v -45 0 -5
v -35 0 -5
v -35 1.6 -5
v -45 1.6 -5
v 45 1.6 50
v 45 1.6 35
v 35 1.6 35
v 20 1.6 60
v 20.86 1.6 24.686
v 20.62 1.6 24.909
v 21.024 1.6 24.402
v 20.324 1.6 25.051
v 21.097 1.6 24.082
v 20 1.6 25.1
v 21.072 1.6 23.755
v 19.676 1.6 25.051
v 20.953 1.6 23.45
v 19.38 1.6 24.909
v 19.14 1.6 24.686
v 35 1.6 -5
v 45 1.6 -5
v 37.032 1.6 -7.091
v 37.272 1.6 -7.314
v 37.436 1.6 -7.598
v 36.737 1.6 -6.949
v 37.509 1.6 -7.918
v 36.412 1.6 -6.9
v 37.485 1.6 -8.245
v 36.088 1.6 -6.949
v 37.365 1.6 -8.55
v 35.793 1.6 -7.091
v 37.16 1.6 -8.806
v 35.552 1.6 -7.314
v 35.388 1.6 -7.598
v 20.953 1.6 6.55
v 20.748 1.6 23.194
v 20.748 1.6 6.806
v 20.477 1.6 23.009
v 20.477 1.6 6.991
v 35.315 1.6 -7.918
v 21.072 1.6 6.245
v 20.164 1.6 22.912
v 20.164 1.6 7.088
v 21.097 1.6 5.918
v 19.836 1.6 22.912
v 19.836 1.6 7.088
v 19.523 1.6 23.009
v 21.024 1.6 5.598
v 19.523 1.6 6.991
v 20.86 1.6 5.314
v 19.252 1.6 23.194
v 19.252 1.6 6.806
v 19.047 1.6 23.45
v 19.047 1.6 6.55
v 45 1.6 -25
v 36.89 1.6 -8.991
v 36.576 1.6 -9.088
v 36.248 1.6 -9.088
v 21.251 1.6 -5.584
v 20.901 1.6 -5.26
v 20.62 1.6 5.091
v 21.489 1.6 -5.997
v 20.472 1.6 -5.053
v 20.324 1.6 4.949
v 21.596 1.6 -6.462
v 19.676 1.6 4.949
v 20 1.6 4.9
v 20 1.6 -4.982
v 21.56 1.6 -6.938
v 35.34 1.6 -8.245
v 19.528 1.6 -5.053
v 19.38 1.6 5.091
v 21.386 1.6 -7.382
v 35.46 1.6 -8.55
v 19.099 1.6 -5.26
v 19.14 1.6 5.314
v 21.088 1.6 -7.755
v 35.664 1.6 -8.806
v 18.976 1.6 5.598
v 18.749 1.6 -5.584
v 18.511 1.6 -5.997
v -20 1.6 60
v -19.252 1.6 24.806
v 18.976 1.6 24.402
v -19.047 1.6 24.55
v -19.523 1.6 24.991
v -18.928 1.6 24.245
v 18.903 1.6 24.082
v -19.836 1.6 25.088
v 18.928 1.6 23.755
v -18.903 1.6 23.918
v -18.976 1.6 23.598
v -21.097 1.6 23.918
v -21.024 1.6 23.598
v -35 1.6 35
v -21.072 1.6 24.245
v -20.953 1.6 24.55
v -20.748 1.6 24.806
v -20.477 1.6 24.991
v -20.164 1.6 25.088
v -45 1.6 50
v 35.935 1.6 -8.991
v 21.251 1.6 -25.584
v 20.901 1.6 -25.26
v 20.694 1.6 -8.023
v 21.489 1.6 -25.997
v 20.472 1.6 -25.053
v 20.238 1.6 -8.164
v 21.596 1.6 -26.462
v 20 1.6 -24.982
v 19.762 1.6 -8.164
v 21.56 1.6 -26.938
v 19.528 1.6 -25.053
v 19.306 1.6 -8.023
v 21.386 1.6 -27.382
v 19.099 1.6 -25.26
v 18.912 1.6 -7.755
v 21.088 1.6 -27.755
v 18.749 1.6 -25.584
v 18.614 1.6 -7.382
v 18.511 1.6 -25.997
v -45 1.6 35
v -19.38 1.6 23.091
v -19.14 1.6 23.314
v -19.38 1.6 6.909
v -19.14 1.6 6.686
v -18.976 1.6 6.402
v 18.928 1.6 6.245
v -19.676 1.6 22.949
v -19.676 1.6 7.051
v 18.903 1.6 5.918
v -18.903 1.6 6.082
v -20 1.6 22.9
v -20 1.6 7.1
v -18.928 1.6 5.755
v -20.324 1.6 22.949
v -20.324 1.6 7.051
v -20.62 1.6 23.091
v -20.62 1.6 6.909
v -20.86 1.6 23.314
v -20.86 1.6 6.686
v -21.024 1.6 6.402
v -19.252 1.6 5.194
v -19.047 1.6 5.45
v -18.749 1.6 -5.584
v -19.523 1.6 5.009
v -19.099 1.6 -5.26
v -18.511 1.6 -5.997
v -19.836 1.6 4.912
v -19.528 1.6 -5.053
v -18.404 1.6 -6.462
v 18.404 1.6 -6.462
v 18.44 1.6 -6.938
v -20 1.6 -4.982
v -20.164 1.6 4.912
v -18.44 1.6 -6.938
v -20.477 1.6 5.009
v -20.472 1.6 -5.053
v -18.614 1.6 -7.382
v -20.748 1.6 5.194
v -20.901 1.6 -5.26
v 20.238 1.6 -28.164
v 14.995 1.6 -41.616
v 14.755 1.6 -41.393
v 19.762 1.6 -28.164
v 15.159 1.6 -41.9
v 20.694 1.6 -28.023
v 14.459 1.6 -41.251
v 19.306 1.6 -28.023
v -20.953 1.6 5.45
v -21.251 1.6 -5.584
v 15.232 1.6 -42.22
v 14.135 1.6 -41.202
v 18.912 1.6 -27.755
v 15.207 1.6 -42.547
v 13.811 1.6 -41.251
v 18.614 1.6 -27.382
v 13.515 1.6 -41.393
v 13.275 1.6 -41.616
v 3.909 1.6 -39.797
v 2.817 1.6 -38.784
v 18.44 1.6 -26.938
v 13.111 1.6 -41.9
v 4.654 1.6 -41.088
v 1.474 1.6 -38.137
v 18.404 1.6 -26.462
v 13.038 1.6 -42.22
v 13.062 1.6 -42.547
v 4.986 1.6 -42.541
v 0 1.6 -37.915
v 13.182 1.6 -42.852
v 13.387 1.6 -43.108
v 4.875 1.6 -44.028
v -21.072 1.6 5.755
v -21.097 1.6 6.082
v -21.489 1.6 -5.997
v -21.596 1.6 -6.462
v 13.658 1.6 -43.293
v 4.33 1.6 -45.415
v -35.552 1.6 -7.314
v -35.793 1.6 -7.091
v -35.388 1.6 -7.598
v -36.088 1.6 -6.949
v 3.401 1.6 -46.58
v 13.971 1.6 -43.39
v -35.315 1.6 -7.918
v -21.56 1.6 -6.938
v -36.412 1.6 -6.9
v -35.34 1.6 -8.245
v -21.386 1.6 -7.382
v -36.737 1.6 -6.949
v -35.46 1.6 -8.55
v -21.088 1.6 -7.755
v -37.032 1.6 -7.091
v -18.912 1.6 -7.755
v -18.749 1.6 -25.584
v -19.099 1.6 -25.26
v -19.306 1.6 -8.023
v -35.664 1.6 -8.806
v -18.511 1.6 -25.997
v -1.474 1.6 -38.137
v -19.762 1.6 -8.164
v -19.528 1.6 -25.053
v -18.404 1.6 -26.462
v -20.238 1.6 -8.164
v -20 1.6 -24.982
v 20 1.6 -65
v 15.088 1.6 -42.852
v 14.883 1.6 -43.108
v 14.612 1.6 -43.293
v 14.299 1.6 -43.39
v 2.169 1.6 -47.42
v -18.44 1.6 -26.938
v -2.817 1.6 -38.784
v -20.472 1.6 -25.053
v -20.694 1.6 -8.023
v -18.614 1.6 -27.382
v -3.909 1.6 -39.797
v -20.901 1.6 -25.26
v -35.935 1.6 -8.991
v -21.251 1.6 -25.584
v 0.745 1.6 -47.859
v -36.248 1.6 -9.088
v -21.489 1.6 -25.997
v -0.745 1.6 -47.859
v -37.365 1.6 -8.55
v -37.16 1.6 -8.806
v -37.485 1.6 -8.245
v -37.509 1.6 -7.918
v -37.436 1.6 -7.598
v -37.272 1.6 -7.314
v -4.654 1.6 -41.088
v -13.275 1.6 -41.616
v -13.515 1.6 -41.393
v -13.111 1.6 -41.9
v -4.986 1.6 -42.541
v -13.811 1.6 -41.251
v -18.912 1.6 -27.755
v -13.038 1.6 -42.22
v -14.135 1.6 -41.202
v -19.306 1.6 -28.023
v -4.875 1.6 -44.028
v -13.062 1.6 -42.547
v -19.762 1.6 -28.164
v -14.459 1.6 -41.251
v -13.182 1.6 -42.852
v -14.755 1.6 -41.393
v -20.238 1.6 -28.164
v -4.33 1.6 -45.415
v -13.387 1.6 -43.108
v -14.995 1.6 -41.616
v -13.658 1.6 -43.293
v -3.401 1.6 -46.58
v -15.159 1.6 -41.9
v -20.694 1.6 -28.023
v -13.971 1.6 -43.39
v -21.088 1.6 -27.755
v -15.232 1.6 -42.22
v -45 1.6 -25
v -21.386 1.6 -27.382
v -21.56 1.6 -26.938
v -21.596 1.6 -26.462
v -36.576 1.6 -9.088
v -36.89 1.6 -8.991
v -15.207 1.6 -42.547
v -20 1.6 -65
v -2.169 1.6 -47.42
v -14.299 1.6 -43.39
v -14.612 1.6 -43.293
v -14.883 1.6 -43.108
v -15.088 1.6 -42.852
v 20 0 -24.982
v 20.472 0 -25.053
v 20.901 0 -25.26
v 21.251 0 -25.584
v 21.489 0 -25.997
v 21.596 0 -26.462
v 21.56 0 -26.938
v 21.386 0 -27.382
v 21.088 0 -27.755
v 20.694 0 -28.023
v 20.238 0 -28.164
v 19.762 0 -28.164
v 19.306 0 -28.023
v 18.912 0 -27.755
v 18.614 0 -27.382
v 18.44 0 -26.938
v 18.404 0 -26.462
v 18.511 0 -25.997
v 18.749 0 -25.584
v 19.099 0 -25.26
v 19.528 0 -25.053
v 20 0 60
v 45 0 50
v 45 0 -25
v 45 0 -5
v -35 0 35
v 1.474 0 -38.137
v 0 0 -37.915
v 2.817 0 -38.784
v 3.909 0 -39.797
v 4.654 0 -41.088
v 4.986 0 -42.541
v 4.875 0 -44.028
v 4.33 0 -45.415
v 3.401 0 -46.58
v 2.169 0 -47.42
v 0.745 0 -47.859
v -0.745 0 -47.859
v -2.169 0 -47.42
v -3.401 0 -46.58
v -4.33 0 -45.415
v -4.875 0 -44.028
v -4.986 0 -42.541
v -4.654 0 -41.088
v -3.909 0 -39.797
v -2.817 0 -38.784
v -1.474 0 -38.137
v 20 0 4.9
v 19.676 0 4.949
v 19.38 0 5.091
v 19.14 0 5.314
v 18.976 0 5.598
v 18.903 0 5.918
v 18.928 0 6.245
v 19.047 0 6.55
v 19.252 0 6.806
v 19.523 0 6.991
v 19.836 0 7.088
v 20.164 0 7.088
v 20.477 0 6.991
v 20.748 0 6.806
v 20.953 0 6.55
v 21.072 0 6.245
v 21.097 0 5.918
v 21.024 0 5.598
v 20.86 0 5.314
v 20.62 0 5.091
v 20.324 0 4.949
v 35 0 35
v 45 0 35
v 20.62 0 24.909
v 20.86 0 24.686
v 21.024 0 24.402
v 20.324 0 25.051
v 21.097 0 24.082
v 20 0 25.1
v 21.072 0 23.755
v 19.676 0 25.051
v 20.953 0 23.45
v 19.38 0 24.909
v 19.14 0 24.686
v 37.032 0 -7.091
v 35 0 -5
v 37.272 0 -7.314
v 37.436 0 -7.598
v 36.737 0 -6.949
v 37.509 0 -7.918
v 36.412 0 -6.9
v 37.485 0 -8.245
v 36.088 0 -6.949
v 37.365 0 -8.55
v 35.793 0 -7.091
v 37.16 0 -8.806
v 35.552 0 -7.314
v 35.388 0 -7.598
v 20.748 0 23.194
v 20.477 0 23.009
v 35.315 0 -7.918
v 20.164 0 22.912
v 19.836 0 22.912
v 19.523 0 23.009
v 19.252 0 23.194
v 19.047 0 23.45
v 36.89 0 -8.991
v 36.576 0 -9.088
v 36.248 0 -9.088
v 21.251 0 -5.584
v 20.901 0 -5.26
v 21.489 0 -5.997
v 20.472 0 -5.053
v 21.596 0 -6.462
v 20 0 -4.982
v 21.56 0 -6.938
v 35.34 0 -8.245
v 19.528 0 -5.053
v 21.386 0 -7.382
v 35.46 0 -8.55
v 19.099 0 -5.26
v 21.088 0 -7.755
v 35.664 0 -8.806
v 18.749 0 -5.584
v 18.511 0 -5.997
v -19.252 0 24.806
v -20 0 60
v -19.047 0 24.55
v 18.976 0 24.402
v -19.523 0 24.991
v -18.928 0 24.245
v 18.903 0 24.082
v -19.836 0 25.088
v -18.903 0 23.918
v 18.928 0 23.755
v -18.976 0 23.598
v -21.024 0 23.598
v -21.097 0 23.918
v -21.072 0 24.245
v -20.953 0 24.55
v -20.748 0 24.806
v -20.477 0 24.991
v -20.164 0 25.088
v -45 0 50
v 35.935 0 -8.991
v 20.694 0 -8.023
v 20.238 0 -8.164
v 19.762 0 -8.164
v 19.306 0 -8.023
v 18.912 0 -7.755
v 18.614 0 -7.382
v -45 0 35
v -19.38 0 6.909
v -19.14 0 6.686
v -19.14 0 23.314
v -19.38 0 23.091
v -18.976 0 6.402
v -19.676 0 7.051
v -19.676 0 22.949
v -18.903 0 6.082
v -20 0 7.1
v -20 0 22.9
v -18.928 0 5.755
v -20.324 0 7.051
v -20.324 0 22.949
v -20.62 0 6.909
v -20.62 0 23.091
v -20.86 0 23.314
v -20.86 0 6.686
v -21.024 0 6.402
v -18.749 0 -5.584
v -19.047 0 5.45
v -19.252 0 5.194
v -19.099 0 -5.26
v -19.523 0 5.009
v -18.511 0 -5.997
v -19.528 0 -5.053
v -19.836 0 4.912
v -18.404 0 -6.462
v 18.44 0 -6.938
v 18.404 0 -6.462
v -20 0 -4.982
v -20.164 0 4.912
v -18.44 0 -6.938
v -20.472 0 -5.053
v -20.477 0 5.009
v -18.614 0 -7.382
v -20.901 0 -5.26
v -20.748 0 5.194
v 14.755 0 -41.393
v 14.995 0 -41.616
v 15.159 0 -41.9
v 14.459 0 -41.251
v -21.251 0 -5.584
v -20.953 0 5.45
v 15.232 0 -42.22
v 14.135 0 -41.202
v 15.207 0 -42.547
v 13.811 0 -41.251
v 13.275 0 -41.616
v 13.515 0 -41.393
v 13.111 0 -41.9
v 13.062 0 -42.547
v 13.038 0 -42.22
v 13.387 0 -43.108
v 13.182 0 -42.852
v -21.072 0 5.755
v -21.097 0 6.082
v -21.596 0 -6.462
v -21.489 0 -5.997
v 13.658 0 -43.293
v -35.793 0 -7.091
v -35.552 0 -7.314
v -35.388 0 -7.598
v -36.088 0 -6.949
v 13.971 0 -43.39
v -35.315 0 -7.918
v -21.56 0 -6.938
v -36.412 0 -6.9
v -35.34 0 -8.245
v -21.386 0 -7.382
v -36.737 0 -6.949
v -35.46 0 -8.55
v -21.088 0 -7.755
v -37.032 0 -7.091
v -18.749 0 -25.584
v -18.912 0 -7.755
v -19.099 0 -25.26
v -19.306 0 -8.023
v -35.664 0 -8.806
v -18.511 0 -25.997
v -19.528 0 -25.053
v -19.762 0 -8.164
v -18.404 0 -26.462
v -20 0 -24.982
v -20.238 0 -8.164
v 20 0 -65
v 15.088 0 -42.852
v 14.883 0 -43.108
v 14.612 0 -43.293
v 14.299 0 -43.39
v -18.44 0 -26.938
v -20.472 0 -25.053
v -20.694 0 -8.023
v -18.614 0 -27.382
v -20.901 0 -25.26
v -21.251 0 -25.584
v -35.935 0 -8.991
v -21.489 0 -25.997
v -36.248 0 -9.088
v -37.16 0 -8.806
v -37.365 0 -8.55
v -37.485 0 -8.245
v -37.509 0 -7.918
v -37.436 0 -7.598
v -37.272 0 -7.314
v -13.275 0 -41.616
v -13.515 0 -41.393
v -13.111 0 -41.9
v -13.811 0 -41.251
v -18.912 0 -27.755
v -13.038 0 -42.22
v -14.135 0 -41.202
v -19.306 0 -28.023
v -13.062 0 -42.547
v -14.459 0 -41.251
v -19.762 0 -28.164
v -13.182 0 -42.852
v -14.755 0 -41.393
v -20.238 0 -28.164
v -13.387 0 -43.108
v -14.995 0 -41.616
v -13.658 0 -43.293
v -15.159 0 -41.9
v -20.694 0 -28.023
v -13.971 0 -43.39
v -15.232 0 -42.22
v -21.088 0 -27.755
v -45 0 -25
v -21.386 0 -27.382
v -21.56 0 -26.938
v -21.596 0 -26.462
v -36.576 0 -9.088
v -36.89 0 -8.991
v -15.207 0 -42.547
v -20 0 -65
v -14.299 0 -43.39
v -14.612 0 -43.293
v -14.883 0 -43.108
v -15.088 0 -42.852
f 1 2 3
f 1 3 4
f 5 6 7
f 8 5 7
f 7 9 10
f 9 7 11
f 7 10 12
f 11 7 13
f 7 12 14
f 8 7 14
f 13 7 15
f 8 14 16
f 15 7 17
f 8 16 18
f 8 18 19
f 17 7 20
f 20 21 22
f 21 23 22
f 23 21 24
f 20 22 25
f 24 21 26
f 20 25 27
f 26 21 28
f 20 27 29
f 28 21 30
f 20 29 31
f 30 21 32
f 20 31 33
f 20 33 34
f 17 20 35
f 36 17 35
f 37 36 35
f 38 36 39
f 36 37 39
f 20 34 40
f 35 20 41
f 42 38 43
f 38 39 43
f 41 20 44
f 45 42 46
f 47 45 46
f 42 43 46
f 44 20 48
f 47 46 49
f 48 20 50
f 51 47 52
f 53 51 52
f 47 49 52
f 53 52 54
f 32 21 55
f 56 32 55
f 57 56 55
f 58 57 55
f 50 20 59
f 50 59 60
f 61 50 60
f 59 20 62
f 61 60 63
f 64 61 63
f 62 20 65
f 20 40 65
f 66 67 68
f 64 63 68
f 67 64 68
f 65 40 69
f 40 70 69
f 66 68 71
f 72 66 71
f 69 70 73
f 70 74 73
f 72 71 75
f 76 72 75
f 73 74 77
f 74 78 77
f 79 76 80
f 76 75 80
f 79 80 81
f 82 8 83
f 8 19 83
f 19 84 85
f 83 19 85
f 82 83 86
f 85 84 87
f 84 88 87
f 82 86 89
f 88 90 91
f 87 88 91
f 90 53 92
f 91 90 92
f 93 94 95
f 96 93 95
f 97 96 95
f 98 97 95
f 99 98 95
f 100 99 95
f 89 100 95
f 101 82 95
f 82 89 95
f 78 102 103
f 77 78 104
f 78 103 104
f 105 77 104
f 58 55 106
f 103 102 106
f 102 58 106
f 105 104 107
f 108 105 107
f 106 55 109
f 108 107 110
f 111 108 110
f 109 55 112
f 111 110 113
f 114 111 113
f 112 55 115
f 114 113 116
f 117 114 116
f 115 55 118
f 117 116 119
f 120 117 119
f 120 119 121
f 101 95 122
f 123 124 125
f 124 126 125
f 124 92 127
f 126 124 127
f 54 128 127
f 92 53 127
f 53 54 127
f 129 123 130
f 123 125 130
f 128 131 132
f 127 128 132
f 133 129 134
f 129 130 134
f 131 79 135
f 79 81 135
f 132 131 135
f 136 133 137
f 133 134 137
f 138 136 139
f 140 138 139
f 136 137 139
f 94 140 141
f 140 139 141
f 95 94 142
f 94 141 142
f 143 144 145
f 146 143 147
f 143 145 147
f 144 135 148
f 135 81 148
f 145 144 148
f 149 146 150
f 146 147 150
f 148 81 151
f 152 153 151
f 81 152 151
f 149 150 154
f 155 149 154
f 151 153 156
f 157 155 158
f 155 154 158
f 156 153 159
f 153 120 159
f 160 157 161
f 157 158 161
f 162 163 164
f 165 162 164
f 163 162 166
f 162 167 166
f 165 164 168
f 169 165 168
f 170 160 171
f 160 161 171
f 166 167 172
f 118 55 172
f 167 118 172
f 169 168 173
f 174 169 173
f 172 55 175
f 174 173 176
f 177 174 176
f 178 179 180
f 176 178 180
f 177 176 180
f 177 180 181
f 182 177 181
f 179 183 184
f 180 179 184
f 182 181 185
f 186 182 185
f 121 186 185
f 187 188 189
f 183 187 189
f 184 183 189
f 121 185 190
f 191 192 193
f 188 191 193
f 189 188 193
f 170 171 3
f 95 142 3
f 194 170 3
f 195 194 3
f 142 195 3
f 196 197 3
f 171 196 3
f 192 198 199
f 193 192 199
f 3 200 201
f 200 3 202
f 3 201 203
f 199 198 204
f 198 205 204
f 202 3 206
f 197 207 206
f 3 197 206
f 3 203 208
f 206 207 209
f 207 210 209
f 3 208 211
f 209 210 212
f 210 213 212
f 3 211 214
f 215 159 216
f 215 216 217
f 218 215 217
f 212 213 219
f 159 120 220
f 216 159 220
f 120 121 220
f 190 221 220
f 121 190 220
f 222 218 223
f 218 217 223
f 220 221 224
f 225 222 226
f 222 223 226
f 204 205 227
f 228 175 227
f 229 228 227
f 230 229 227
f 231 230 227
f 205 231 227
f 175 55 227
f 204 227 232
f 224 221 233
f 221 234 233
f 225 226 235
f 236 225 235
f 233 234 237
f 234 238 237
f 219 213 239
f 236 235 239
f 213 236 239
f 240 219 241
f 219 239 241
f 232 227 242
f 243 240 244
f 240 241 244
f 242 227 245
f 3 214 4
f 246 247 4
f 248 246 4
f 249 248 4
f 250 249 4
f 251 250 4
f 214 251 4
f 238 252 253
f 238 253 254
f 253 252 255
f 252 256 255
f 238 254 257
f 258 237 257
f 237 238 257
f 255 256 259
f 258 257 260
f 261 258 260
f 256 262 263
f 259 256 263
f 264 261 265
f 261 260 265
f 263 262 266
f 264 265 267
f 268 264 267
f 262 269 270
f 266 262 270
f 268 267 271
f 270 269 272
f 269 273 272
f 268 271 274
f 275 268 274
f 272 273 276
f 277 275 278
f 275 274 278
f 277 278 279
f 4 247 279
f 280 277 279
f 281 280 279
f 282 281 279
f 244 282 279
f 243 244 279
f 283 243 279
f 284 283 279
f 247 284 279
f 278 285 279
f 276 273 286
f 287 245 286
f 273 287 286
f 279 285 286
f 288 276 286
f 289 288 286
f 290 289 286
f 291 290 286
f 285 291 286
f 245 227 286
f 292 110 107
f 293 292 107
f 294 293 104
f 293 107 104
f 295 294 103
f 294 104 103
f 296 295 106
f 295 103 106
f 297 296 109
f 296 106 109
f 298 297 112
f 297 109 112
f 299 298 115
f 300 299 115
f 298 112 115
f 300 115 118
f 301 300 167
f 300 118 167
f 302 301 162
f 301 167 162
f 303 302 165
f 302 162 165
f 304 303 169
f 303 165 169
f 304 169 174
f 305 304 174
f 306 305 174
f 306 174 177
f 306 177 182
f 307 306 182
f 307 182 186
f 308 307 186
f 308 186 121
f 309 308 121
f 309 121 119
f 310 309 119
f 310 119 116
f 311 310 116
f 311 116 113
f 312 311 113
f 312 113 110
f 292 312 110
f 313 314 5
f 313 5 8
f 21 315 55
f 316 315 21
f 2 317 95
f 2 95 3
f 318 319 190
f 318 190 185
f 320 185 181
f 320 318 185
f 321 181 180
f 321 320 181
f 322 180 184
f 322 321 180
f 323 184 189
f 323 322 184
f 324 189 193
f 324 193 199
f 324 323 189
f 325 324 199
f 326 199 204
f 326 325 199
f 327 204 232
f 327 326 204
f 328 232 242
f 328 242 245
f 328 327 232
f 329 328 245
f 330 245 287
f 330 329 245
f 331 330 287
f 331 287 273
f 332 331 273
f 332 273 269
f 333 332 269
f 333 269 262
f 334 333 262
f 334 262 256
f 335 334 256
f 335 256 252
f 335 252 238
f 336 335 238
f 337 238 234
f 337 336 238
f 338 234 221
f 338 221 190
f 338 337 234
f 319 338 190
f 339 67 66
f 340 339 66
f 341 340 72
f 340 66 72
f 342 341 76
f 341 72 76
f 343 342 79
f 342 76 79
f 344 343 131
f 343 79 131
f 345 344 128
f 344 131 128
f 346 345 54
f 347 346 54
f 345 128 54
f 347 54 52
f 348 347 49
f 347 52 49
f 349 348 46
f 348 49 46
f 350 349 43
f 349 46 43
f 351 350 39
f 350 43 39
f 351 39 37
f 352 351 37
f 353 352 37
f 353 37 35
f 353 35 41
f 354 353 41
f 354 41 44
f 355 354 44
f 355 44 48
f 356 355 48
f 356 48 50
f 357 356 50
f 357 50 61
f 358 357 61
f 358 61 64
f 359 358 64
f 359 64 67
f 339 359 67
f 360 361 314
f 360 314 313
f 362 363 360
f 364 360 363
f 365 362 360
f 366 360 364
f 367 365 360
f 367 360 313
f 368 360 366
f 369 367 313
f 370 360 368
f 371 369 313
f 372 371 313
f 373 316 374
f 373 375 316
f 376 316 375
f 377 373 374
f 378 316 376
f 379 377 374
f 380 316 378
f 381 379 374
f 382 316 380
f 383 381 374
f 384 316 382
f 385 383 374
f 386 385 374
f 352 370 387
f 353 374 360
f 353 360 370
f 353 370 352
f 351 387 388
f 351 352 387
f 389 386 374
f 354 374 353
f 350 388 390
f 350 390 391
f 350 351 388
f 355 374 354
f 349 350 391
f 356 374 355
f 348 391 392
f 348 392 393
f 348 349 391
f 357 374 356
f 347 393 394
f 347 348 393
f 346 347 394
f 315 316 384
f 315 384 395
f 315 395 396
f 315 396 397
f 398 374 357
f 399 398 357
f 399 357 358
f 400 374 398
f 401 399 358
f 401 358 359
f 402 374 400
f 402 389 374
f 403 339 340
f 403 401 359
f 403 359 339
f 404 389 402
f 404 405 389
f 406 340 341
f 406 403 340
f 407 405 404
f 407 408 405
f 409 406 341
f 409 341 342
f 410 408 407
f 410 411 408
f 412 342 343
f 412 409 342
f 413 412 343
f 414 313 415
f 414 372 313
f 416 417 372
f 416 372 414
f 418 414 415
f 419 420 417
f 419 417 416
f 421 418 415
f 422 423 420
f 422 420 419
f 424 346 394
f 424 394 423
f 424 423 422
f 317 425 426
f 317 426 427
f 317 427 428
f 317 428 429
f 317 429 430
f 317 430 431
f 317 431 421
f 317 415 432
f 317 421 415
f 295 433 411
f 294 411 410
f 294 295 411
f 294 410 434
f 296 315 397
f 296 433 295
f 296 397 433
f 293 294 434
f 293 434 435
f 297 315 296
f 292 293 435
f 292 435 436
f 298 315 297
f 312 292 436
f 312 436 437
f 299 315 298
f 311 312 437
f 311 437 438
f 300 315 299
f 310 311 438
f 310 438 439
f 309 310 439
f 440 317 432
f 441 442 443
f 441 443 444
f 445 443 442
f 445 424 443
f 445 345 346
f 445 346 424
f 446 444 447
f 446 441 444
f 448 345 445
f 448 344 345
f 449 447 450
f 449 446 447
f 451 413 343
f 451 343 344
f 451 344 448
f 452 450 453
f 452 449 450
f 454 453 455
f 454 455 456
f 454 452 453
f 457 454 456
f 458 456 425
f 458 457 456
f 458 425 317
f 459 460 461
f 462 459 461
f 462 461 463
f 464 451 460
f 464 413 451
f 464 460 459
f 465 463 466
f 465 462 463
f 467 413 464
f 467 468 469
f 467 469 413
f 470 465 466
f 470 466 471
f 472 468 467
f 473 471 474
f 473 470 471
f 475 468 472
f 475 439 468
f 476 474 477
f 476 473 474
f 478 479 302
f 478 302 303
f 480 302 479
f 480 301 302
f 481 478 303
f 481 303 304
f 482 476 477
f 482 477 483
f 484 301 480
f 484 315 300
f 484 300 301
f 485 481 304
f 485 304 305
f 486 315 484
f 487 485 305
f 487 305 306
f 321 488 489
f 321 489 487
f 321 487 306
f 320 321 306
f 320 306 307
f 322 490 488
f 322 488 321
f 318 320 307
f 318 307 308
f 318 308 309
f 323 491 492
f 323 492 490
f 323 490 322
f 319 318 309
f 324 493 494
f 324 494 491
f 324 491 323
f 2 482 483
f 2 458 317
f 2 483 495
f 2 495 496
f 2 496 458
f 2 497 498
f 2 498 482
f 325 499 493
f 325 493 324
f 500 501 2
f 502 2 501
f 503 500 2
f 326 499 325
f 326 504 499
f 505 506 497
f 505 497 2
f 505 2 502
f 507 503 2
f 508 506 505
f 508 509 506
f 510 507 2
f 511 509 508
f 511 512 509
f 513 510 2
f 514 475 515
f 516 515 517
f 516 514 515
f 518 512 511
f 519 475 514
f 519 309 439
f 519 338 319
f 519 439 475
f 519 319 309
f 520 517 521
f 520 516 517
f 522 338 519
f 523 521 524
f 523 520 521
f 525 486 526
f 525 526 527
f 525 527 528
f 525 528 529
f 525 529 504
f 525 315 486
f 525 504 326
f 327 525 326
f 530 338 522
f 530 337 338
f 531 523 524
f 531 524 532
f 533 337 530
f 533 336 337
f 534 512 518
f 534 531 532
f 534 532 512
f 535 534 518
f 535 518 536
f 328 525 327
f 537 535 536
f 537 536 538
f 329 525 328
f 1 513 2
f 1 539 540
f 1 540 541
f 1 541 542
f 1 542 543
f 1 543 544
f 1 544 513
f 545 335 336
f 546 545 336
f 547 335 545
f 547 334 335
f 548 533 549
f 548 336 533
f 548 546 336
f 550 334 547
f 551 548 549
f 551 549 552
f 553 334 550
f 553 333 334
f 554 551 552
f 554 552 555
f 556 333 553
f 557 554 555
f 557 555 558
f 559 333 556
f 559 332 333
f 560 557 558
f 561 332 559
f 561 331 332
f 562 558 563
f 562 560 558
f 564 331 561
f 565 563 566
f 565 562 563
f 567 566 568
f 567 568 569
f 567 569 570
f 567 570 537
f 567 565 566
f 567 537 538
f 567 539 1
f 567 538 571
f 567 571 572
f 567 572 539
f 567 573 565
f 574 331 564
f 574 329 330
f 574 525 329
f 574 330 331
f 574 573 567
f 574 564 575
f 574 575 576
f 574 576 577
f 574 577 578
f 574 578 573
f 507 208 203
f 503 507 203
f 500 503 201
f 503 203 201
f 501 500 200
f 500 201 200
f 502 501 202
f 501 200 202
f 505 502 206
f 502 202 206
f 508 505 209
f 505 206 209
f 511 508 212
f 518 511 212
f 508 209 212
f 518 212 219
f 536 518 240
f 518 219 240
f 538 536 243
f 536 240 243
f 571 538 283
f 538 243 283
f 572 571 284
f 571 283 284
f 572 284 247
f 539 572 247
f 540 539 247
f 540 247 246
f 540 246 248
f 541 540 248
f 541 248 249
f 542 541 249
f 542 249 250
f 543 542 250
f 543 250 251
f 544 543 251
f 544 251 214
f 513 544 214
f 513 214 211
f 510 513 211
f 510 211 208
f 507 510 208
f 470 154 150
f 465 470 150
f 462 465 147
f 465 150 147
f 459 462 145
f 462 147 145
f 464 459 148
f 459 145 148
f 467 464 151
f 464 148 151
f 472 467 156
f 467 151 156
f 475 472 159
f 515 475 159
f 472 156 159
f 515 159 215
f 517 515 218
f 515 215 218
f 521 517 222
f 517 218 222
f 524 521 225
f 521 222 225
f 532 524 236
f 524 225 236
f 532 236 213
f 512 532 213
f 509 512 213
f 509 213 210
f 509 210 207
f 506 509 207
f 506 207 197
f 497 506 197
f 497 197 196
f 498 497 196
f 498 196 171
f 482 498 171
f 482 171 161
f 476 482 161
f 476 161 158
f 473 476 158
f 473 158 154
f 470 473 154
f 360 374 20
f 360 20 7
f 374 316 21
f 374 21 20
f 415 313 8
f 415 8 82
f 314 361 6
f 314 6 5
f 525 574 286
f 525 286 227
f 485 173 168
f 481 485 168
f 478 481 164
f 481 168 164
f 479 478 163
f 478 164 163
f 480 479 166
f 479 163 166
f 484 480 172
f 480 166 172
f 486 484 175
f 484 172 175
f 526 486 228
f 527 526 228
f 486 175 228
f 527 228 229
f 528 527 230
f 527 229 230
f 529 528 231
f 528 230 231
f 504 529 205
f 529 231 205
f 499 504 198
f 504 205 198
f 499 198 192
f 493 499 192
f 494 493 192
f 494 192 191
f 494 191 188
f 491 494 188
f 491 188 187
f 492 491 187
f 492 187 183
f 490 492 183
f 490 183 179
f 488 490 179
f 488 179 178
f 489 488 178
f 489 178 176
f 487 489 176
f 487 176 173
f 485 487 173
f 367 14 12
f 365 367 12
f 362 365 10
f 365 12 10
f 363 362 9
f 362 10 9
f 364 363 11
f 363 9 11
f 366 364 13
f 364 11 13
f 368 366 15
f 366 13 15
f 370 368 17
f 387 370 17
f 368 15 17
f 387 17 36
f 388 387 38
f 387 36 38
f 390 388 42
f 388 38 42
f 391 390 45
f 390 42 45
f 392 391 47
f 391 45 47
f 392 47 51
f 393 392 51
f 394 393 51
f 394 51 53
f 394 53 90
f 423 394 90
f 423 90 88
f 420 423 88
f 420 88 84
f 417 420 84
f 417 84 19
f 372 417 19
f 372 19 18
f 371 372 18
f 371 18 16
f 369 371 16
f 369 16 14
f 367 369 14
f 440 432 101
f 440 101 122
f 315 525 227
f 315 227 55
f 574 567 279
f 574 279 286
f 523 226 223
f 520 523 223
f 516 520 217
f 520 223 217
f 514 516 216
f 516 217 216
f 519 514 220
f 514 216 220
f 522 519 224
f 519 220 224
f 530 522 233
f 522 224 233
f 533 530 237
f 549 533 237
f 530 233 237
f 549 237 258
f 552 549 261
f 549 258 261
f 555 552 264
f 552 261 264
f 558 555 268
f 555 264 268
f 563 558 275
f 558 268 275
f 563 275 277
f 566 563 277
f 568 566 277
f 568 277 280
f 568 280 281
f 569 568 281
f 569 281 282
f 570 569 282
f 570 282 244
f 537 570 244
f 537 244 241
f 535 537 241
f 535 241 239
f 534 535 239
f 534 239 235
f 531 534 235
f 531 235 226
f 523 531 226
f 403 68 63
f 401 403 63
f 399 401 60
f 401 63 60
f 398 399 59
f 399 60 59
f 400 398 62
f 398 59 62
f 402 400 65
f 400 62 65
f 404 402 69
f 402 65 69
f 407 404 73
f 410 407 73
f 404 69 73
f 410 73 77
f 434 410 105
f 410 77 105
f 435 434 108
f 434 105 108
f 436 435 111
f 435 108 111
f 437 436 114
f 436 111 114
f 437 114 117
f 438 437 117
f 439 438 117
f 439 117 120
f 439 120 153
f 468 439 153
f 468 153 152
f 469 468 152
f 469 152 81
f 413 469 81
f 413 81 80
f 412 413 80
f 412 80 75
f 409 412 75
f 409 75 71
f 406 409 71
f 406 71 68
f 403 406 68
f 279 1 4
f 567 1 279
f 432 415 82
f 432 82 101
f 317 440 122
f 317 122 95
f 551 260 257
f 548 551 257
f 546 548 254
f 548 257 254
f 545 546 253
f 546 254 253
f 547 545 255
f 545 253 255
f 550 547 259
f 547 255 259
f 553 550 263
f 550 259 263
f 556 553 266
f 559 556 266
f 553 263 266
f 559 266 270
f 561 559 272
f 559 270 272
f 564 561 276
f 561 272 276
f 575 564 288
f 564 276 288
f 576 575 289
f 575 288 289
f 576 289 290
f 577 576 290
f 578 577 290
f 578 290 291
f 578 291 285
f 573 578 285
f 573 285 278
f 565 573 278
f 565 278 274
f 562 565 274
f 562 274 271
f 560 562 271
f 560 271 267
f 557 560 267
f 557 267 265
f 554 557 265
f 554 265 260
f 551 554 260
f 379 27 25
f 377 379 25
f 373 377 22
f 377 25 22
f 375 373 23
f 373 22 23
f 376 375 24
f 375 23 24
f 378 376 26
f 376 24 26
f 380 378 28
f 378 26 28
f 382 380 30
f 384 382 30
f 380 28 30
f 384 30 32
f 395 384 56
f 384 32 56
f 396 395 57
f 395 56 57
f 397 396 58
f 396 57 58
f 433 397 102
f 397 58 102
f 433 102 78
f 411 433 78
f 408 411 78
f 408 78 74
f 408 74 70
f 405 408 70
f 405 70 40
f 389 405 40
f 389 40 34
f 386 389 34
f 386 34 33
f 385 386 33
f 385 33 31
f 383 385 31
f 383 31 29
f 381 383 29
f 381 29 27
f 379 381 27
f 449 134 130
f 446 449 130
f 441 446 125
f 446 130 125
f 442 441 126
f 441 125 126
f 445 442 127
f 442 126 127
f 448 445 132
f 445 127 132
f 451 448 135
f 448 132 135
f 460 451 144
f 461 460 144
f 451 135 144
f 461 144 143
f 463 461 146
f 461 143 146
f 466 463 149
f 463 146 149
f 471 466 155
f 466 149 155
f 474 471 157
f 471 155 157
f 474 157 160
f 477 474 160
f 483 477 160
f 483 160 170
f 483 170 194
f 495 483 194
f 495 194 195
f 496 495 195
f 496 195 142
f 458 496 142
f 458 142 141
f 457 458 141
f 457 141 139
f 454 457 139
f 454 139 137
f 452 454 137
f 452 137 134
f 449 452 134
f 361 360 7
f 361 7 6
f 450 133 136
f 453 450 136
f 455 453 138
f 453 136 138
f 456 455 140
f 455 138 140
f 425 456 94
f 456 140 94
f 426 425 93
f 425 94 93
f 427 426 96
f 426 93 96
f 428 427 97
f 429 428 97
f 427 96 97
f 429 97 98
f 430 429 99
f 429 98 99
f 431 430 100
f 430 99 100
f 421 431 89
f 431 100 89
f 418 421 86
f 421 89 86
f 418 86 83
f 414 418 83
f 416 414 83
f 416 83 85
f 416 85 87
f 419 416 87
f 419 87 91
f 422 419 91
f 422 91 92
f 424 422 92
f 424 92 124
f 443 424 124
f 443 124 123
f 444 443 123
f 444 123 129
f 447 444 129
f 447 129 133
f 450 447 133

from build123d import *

# Parameters (mm, degrees)
SKETCH1_R           = 5
BOSS_EXTRUDE1_DEPTH = 1.6
SKETCH2_R           = 1.1
CUT_EXTRUDE1_DEPTH  = 80.073130708
CUT_EXTRUDE2_REACH  = 81.073
SKETCH3_R           = 1.6
CUT_EXTRUDE3_REACH  = 81.073
SKETCH5_R           = 1.1


with BuildPart() as part:
    # Sketch1 → Boss-Extrude1 (new body)
    with BuildSketch(Plane(origin=(0, 0, 0), x_dir=(1, 0, 0), z_dir=(0, 1, 0))):
        Polygon((-20, 65), (20, 65), (45, 25), (45, 5), (35, 5), (35, -35), (45, -35), (45, -50), (20, -60), (-20, -60), (-45, -50), (-45, -35), (-35, -35), (-35, 5), (-45, 5), (-45, 25), align=None)
        with Locations(Location((0, 42.914947937, 0), (0, 0, 270))):
            Circle(SKETCH1_R, mode=Mode.SUBTRACT)
    extrude(amount=BOSS_EXTRUDE1_DEPTH)

    # Sketch2 → Cut-Extrude1 (cut, through all)
    with BuildSketch(Plane(origin=(0, 1.6, 0), x_dir=(1, 0, 0), z_dir=(0, 1, 0))):
        with Locations(Location((-20, -6, 0), (0, 0, 270))):
            Circle(SKETCH2_R)
        with Locations(Location((-20, -24, 0), (0, 0, 90))):
            Circle(SKETCH2_R)
        with Locations(Location((20, -24, 0), (0, 0, 270))):
            Circle(SKETCH2_R)
        with Locations(Location((20, -6, 0), (0, 0, 90))):
            Circle(SKETCH2_R)
    extrude(amount=-CUT_EXTRUDE1_DEPTH, mode=Mode.SUBTRACT)

    # Sketch3 → Cut-Extrude2 (cut, up to next)
    with BuildSketch(Plane(origin=(0, 1.6, 0), x_dir=(1, 0, 0), z_dir=(0, 1, 0)), mode=Mode.PRIVATE) as cut_extrude2_sk1:
        with Locations(Location((-20, 26.581871199, 0), (0, 0, 270))):
            Circle(SKETCH3_R)
    cut_extrude2_tool1 = extrude(cut_extrude2_sk1.sketch, amount=-CUT_EXTRUDE2_REACH, mode=Mode.PRIVATE) & part.part
    # Sketch3 → Cut-Extrude2 (cut, up to next)
    with BuildSketch(Plane(origin=(0, 1.6, 0), x_dir=(1, 0, 0), z_dir=(0, 1, 0)), mode=Mode.PRIVATE) as cut_extrude2_sk2:
        with Locations(Location((20, 26.581871199, 0), (0, 0, 270))):
            Circle(SKETCH3_R)
    cut_extrude2_tool2 = extrude(cut_extrude2_sk2.sketch, amount=-CUT_EXTRUDE2_REACH, mode=Mode.PRIVATE) & part.part
    # Sketch3 → Cut-Extrude2 (cut, up to next)
    with BuildSketch(Plane(origin=(0, 1.6, 0), x_dir=(1, 0, 0), z_dir=(0, 1, 0)), mode=Mode.PRIVATE) as cut_extrude2_sk3:
        with Locations(Location((20, 6.581871199, 0), (0, 0, 270))):
            Circle(SKETCH3_R)
    cut_extrude2_tool3 = extrude(cut_extrude2_sk3.sketch, amount=-CUT_EXTRUDE2_REACH, mode=Mode.PRIVATE) & part.part
    # Sketch3 → Cut-Extrude2 (cut, up to next)
    with BuildSketch(Plane(origin=(0, 1.6, 0), x_dir=(1, 0, 0), z_dir=(0, 1, 0)), mode=Mode.PRIVATE) as cut_extrude2_sk4:
        with Locations(Location((-20, 6.581871199, 0), (0, 0, 270))):
            Circle(SKETCH3_R)
    cut_extrude2_tool4 = extrude(cut_extrude2_sk4.sketch, amount=-CUT_EXTRUDE2_REACH, mode=Mode.PRIVATE) & part.part
    add(cut_extrude2_tool1.solids().sort_by_distance((-20, 1.6, -26.581871))[0], mode=Mode.SUBTRACT)
    add(cut_extrude2_tool2.solids().sort_by_distance((20, 1.6, -26.581871))[0], mode=Mode.SUBTRACT)
    add(cut_extrude2_tool3.solids().sort_by_distance((20, 1.6, -6.581871))[0], mode=Mode.SUBTRACT)
    add(cut_extrude2_tool4.solids().sort_by_distance((-20, 1.6, -6.581871))[0], mode=Mode.SUBTRACT)

    # Sketch5 → Cut-Extrude3 (cut, up to next)
    with BuildSketch(Plane(origin=(0, 1.6, 0), x_dir=(1, 0, 0), z_dir=(0, 1, 0)), mode=Mode.PRIVATE) as cut_extrude3_sk1:
        with Locations(Location((-36.412283149, 8, 0), (0, 0, 270))):
            Circle(SKETCH5_R)
    cut_extrude3_tool1 = extrude(cut_extrude3_sk1.sketch, amount=-CUT_EXTRUDE3_REACH, mode=Mode.PRIVATE) & part.part
    # Sketch5 → Cut-Extrude3 (cut, up to next)
    with BuildSketch(Plane(origin=(0, 1.6, 0), x_dir=(1, 0, 0), z_dir=(0, 1, 0)), mode=Mode.PRIVATE) as cut_extrude3_sk2:
        with Locations(Location((36.412283149, 8, 0), (0, 0, 270))):
            Circle(SKETCH5_R)
    cut_extrude3_tool2 = extrude(cut_extrude3_sk2.sketch, amount=-CUT_EXTRUDE3_REACH, mode=Mode.PRIVATE) & part.part
    # Sketch5 → Cut-Extrude3 (cut, up to next)
    with BuildSketch(Plane(origin=(0, 1.6, 0), x_dir=(1, 0, 0), z_dir=(0, 1, 0)), mode=Mode.PRIVATE) as cut_extrude3_sk3:
        with Locations(Location((-14.134917172, 42.301953571, 0), (0, 0, 270))):
            Circle(SKETCH5_R)
    cut_extrude3_tool3 = extrude(cut_extrude3_sk3.sketch, amount=-CUT_EXTRUDE3_REACH, mode=Mode.PRIVATE) & part.part
    # Sketch5 → Cut-Extrude3 (cut, up to next)
    with BuildSketch(Plane(origin=(0, 1.6, 0), x_dir=(1, 0, 0), z_dir=(0, 1, 0)), mode=Mode.PRIVATE) as cut_extrude3_sk4:
        with Locations(Location((14.134917172, 42.301953571, 0), (0, 0, 270))):
            Circle(SKETCH5_R)
    cut_extrude3_tool4 = extrude(cut_extrude3_sk4.sketch, amount=-CUT_EXTRUDE3_REACH, mode=Mode.PRIVATE) & part.part
    add(cut_extrude3_tool1.solids().sort_by_distance((-36.412283, 1.6, -8))[0], mode=Mode.SUBTRACT)
    add(cut_extrude3_tool2.solids().sort_by_distance((36.412283, 1.6, -8))[0], mode=Mode.SUBTRACT)
    add(cut_extrude3_tool3.solids().sort_by_distance((-14.134917, 1.6, -42.301954))[0], mode=Mode.SUBTRACT)
    add(cut_extrude3_tool4.solids().sort_by_distance((14.134917, 1.6, -42.301954))[0], mode=Mode.SUBTRACT)


solid = part.part
